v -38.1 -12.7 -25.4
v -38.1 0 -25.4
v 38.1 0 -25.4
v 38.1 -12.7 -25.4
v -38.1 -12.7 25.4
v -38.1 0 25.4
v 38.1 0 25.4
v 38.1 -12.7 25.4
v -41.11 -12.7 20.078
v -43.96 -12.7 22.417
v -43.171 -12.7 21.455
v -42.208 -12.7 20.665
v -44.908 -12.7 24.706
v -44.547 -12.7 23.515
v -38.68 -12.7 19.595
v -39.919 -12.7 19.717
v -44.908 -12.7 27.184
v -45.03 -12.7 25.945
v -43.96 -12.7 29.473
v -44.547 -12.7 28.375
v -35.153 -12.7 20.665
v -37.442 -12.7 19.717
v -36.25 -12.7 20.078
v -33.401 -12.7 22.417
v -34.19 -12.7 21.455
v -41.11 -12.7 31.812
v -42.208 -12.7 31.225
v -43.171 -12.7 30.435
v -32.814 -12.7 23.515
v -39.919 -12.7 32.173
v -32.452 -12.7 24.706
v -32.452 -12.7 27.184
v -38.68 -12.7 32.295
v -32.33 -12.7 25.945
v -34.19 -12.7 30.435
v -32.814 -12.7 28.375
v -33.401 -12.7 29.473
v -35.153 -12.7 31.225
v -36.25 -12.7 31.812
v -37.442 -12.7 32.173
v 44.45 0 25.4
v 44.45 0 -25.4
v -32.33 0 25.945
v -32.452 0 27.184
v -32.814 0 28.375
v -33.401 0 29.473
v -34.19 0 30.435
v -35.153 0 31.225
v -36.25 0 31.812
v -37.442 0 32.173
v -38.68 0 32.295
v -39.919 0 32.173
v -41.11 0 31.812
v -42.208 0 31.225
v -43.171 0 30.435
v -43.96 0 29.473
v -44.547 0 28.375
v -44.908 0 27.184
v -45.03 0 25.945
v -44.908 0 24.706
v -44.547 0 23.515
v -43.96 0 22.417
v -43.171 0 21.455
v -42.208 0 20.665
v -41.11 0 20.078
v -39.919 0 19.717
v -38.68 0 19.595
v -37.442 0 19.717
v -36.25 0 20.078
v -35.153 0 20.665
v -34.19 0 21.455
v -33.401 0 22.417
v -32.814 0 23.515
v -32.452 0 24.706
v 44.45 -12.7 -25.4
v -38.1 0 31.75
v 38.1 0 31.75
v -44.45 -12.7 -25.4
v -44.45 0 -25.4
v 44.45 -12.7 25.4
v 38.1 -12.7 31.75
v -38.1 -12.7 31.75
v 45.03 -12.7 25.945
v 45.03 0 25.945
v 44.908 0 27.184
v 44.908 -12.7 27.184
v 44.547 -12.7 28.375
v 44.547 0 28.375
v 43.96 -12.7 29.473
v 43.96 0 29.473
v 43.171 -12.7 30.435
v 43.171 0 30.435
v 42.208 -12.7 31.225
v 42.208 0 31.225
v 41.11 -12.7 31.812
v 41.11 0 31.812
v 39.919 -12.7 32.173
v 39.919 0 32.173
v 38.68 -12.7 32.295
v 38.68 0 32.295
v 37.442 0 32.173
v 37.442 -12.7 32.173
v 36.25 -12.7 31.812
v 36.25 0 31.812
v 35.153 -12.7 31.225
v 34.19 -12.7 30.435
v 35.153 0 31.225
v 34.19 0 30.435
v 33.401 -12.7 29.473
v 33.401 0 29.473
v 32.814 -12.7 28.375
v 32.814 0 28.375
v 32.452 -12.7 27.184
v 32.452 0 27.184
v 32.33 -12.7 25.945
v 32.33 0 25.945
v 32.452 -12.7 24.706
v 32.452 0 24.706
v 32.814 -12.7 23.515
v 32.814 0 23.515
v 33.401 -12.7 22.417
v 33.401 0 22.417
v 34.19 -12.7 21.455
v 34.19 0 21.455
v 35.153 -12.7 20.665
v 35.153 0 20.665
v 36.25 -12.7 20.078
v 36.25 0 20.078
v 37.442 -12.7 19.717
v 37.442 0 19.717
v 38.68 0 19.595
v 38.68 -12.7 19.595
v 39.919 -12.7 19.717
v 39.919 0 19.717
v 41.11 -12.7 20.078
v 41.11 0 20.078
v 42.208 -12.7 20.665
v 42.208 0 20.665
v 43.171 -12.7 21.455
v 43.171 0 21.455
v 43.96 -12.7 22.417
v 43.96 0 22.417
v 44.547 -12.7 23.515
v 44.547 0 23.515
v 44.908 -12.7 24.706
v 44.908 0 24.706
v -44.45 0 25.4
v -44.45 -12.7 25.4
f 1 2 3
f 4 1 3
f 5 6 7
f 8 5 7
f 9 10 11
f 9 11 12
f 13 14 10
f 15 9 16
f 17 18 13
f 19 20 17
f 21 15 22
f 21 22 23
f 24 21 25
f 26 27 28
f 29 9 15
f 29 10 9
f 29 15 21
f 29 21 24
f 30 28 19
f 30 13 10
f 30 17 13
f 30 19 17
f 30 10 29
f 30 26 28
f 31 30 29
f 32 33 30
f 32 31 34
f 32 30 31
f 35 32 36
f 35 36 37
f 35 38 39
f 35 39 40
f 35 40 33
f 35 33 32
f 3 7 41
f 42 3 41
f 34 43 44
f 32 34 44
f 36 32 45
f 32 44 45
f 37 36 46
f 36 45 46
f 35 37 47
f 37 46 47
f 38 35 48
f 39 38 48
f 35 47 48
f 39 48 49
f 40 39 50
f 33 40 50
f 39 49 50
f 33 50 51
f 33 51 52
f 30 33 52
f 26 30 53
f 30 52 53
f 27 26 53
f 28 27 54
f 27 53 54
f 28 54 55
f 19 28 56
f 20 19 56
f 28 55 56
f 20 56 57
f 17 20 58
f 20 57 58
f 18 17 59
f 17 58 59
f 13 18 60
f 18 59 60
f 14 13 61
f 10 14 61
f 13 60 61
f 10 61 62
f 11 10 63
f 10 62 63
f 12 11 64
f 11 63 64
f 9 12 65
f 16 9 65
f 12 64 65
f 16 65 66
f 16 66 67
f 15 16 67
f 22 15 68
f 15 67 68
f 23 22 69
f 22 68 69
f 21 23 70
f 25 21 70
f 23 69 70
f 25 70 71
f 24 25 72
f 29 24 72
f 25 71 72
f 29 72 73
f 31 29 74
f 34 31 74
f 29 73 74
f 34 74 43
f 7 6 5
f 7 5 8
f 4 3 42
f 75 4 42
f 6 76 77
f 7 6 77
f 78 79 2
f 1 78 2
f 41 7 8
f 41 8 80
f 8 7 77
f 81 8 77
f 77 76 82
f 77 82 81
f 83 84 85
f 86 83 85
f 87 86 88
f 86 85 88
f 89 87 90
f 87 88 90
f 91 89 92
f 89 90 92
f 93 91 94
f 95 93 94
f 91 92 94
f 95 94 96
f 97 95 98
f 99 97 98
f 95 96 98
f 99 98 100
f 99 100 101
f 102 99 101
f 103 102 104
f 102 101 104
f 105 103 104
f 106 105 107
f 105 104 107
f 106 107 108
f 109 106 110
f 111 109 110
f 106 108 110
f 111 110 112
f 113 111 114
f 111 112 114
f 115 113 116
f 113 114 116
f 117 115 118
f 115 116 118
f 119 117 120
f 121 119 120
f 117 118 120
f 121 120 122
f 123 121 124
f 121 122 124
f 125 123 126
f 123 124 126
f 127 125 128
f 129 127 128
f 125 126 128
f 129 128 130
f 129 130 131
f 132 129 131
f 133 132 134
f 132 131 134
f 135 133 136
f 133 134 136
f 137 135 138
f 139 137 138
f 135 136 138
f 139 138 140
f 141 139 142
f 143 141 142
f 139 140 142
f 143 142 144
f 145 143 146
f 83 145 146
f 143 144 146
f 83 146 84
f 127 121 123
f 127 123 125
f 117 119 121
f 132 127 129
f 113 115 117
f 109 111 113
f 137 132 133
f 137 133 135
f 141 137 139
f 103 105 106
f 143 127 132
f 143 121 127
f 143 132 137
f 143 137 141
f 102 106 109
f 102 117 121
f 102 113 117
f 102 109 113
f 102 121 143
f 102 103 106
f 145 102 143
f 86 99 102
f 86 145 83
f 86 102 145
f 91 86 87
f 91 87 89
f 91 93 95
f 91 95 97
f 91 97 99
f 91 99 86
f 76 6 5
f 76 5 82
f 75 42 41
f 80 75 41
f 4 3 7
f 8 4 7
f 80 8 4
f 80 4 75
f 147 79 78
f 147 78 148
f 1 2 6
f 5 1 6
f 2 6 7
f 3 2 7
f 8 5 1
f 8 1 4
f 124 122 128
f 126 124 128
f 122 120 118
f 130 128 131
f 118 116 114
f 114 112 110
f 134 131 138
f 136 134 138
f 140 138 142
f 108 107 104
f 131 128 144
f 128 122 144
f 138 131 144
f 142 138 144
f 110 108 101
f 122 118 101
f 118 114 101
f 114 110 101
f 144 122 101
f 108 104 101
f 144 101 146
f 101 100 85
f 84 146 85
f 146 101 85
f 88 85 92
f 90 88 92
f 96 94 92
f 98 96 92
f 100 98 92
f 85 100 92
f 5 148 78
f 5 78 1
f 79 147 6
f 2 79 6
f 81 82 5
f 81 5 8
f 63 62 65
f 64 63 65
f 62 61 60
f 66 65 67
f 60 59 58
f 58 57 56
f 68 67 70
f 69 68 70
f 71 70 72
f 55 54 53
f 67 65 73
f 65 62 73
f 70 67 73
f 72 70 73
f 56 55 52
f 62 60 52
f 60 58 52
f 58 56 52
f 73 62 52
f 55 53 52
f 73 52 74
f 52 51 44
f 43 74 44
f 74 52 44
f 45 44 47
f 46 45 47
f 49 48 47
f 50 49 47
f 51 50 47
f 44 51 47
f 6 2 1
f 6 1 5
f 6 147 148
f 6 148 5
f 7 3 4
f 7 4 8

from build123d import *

# Parameters (mm, degrees)
F0_W     = 76.2
F0_H     = 50.8
F3_DEPTH = 12.7
F1_R     = 6.35
F2_W     = 6.35
F2_H     = 50.8
F2_W_2   = 76.2
F2_H_2   = 6.35


# Not quite as in the source:
# - a feature of the source that left no trace in its solid (it failed there, or was rolled back) is left out


with BuildPart() as f3:
    # F0 (on Front) → F3 (new body)
    with BuildSketch(Plane.XZ):
        Rectangle(F0_W, F0_H)
    extrude(amount=F3_DEPTH)


with BuildPart() as f3b:
    # F1 (on Front) → F3, piece 2 (new body)
    with BuildSketch(Plane.XZ):
        with Locations((-38.6804193258, 25.9450823069)):
            Circle(F1_R)
    extrude(amount=F3_DEPTH)


with BuildPart() as f3c:
    # F1 (on Front) → F3, piece 3 (new body)
    with BuildSketch(Plane.XZ):
        with Locations((38.6804193258, 25.9450823069)):
            Circle(F1_R)
    extrude(amount=F3_DEPTH)


with BuildPart() as f3d:
    # F2 (on Front) → F3, piece 4 (new body)
    with BuildSketch(Plane.XZ):
        with Locations((41.275, 0)):
            Rectangle(F2_W, F2_H)
    extrude(amount=F3_DEPTH)


with BuildPart() as f3e:
    # F2 (on Front) → F3, piece 5 (new body)
    with BuildSketch(Plane.XZ):
        with Locations((0, 28.575)):
            Rectangle(F2_W_2, F2_H_2)
    extrude(amount=F3_DEPTH)


with BuildPart() as f3f:
    # F2 (on Front) → F3, piece 6 (new body)
    with BuildSketch(Plane.XZ):
        with Locations((-41.275, 0)):
            Rectangle(F2_W, F2_H)
    extrude(amount=F3_DEPTH)


solid = Compound([f3.part, f3b.part, f3c.part, f3d.part, f3e.part, f3f.part])
